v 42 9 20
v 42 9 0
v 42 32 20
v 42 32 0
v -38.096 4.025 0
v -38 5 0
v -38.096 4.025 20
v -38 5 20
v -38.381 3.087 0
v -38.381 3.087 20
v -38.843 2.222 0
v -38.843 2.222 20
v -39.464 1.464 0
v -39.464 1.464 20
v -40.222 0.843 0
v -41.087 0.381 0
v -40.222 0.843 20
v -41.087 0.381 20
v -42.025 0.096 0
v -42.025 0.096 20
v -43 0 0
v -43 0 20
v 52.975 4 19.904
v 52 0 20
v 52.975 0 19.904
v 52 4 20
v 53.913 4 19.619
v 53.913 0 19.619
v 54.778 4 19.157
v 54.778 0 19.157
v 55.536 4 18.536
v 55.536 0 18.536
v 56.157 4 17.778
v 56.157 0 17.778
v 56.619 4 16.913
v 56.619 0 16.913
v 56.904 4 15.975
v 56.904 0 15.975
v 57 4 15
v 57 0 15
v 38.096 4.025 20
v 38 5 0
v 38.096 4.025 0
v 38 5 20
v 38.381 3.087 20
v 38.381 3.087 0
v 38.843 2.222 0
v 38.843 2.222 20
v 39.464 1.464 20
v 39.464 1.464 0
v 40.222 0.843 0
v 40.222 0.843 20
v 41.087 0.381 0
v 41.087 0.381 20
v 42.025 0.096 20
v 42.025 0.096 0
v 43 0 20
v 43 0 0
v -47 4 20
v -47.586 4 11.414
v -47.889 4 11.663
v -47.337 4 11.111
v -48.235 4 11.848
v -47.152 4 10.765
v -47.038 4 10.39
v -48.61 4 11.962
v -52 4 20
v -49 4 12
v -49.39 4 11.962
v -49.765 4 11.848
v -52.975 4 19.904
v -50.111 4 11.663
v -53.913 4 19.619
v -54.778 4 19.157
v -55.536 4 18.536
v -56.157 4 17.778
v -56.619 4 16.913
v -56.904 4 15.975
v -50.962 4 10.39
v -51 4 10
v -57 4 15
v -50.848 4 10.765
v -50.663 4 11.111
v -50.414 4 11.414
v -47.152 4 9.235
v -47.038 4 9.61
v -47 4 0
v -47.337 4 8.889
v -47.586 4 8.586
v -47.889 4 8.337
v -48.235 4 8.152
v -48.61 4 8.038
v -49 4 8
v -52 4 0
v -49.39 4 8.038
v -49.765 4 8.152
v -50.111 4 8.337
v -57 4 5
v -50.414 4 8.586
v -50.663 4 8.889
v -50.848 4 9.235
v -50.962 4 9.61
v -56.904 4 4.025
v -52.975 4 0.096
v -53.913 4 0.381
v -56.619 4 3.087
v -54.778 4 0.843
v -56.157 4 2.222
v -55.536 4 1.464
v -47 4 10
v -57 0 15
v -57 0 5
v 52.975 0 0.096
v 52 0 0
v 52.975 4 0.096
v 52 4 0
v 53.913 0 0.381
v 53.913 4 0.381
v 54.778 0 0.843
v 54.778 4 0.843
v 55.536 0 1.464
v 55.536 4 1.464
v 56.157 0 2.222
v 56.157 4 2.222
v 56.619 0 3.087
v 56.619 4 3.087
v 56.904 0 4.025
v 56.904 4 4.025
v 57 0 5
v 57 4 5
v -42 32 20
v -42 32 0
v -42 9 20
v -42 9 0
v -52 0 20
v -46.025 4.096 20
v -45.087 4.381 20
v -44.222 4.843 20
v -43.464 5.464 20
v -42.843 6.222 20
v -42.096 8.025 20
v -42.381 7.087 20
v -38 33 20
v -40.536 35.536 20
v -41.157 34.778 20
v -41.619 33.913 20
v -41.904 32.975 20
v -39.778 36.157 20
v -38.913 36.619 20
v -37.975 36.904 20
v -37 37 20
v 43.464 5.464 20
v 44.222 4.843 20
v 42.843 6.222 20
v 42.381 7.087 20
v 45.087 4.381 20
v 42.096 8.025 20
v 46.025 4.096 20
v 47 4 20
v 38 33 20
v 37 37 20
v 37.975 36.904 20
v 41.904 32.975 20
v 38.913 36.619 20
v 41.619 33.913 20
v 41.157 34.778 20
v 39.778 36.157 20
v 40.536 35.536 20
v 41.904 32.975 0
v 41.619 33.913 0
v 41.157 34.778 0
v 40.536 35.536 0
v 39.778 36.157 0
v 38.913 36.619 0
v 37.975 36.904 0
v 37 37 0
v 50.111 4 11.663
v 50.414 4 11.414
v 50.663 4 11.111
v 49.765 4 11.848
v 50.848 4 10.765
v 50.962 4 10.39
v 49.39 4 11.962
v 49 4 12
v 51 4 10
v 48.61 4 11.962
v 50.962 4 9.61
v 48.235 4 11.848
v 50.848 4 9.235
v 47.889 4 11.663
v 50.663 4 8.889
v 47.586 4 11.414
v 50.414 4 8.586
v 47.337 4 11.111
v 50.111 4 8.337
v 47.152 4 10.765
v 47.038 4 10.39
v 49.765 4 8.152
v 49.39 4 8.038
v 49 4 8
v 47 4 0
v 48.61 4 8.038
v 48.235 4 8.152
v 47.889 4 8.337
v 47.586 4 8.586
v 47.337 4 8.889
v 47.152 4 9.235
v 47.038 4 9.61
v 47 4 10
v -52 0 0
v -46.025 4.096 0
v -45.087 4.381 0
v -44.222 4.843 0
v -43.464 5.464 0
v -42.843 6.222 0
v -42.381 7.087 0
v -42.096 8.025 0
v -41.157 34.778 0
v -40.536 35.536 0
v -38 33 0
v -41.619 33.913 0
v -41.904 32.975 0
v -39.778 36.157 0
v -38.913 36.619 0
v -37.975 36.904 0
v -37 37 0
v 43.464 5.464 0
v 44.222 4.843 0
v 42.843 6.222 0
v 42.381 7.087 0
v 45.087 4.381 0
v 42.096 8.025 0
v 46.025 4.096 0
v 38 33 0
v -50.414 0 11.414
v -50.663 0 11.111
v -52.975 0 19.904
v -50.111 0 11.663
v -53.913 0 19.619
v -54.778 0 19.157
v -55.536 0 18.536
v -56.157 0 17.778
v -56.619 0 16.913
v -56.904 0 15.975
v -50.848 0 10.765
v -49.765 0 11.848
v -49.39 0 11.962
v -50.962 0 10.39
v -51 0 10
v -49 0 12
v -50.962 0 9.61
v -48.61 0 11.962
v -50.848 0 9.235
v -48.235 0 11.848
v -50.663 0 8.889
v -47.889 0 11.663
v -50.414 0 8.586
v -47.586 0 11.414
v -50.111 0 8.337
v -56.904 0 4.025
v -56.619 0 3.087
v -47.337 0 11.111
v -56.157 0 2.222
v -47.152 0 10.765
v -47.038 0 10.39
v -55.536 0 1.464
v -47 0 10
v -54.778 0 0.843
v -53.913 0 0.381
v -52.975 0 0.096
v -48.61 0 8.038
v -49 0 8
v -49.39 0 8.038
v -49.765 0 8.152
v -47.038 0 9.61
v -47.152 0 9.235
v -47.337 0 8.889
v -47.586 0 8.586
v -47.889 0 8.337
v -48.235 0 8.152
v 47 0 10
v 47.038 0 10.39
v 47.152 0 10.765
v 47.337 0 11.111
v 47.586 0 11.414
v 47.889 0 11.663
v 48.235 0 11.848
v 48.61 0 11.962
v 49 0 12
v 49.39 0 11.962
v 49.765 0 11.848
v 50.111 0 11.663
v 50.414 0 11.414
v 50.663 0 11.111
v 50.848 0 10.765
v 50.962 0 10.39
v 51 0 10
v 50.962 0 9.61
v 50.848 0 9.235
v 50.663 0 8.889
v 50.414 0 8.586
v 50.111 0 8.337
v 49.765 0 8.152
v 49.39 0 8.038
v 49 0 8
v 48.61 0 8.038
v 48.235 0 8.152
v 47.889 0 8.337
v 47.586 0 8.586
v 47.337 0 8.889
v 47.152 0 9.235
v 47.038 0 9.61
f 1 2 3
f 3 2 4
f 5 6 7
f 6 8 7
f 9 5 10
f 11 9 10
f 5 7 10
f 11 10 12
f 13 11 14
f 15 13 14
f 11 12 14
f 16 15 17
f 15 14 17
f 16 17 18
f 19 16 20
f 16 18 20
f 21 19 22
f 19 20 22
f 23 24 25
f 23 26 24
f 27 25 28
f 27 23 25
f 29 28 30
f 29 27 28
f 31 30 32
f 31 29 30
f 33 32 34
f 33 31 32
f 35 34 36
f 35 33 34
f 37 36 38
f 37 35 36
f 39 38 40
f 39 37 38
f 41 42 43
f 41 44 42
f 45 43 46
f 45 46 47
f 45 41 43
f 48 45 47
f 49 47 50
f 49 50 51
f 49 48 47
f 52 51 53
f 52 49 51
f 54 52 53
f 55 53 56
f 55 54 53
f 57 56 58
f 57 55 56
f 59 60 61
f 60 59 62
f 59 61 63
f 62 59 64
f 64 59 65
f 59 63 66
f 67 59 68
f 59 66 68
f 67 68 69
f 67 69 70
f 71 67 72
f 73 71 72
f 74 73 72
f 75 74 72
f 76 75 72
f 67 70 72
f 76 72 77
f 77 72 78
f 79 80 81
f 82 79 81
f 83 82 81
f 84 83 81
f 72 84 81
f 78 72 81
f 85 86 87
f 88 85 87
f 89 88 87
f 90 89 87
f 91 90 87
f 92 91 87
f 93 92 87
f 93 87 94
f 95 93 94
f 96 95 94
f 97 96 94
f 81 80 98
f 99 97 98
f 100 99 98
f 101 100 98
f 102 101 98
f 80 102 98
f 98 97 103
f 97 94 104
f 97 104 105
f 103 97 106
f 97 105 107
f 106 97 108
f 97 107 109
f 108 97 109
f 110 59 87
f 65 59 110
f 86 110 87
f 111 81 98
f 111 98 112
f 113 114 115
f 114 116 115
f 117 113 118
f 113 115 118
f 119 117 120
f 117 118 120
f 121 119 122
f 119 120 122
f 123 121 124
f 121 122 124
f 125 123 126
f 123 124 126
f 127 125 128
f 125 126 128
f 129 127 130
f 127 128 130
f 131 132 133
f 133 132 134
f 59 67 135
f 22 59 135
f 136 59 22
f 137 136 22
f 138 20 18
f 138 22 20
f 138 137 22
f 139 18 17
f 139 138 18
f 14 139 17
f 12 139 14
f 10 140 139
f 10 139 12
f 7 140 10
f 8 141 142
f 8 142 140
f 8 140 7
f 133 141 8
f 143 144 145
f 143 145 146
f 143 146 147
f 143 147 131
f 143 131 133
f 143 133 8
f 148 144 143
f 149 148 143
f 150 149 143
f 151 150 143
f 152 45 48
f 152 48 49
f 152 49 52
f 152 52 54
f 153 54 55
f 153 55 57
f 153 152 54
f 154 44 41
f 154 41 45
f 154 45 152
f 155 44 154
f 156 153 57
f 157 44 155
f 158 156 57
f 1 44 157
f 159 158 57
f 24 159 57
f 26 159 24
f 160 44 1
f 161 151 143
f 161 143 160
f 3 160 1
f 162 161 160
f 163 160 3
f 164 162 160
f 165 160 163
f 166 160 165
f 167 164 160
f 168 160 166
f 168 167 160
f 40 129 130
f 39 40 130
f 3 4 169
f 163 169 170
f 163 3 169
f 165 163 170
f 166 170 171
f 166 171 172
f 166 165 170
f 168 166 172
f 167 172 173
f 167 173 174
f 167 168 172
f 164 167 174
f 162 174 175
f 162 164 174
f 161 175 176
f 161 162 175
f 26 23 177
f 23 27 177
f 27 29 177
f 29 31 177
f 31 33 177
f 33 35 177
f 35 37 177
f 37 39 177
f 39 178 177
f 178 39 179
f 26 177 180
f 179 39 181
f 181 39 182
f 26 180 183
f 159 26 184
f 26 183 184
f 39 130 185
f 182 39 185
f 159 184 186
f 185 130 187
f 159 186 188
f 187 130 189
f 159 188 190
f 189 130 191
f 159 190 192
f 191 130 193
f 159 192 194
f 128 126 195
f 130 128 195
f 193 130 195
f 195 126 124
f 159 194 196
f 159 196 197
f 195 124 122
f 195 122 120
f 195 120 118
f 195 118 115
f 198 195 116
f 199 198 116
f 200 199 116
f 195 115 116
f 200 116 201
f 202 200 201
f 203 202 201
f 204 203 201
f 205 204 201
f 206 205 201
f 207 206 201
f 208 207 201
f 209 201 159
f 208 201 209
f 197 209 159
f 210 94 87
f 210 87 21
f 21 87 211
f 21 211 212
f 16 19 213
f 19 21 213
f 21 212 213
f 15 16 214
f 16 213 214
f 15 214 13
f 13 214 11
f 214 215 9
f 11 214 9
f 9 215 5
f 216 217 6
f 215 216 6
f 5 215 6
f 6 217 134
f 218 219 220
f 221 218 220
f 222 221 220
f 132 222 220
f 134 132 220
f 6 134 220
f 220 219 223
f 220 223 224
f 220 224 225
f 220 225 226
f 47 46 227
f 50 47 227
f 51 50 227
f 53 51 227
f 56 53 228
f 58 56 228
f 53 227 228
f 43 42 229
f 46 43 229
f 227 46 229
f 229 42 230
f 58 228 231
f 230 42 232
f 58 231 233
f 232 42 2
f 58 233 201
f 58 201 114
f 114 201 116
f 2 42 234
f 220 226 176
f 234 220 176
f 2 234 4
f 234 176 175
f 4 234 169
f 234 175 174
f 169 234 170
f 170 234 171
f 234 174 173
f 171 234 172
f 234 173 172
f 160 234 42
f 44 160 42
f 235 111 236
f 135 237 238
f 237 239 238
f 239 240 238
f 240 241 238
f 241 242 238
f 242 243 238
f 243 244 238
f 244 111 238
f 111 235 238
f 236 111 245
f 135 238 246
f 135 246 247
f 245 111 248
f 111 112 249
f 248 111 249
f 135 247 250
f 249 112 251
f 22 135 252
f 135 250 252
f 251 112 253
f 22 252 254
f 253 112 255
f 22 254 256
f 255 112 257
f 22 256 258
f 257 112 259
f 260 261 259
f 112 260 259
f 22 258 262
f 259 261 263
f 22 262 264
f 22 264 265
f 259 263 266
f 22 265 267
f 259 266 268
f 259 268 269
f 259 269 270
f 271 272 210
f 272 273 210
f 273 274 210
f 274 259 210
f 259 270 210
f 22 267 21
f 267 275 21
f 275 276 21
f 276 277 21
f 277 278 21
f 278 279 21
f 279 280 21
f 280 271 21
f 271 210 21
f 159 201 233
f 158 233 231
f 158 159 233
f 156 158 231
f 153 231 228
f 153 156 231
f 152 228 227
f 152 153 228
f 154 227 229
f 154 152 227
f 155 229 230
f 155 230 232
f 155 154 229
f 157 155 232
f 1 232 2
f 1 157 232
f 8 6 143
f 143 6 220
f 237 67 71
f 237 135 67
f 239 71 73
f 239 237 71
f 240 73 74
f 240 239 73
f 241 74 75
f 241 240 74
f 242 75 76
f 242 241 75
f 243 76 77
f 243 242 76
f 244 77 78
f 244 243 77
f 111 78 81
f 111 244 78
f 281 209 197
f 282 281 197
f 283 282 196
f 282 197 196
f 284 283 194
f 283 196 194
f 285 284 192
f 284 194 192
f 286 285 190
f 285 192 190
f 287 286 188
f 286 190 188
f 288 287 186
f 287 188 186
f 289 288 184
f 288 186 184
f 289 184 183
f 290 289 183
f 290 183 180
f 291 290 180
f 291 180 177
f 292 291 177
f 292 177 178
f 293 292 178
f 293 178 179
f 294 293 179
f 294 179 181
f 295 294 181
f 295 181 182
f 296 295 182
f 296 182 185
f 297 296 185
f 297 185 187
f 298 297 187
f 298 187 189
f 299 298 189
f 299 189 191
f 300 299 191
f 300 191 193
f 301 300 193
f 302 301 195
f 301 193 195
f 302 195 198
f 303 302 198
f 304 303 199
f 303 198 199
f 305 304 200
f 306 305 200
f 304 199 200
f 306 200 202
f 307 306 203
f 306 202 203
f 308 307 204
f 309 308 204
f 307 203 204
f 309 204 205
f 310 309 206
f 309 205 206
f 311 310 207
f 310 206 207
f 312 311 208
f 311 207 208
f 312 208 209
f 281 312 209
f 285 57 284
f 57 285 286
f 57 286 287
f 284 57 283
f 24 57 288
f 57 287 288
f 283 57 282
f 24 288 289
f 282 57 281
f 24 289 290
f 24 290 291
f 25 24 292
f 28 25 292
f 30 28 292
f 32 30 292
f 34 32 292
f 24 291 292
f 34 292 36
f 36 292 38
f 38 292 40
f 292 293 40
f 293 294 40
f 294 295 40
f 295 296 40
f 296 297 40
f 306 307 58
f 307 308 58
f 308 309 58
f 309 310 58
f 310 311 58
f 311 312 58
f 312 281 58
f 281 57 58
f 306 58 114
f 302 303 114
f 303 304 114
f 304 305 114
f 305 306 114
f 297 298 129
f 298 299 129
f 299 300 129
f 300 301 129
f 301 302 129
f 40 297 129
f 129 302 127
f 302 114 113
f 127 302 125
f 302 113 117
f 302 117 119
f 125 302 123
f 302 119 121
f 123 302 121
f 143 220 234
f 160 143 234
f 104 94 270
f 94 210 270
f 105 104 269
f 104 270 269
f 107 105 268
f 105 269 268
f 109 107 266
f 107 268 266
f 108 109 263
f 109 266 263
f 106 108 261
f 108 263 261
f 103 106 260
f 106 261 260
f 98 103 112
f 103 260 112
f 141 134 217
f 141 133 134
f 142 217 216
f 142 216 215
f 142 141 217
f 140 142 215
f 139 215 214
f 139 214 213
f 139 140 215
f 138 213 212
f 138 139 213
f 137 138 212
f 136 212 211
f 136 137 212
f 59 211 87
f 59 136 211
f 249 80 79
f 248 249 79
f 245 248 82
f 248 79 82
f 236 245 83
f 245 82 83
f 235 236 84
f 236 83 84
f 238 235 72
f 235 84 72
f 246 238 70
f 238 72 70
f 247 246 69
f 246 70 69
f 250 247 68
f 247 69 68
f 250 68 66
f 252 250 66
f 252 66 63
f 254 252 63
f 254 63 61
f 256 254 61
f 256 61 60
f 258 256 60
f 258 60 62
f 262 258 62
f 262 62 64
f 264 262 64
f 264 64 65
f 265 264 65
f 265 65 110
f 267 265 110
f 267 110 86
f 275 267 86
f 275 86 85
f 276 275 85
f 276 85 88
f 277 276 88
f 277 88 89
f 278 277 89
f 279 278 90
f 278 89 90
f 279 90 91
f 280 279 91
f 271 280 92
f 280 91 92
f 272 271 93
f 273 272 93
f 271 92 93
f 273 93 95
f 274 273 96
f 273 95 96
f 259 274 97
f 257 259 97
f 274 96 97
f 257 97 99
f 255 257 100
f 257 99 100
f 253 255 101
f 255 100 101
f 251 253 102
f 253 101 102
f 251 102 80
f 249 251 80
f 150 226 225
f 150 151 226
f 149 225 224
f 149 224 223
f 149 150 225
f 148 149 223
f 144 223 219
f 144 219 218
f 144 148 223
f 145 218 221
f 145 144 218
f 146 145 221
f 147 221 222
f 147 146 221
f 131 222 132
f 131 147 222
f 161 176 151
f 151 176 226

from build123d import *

# Parameters (mm, degrees)
F1_DEPTH = 20
F2_R     = 2
F3_DEPTH = 25
F4_R     = 4.99999


# Not quite as in the source:
# - a fillet or chamfer is up to 0.001 mm smaller than in the source, because OpenCascade refuses the exact size


with BuildPart() as f1:
    # F0 (on Top) → F1 (new body)
    with BuildSketch(Plane.XY):
        Polygon((-38, 33), (0, 33), (0, 37), (-42, 37), (-42, 4), (-57, 4), (-57, 0), (-38, 0), align=None)
        Polygon((0, 37), (0, 33), (38, 33), (38, 0), (57, 0), (57, 4), (42, 4), (42, 37), align=None)
    extrude(amount=F1_DEPTH)

    # F2 (on face) → F3 (cut)
    with BuildSketch(Plane(origin=(0, 4, 0), x_dir=(-1, 0, 0), z_dir=(0, 1, 0))):
        with Locations((49, 10)):
            Circle(F2_R)
        with Locations((-49, 10)):
            Circle(F2_R)
    extrude(amount=-F3_DEPTH, mode=Mode.SUBTRACT)

    # F4 (radius 5 in the source; OpenCascade refuses exactly that, so slightly less here)
    f4_edges = [f1.edges().sort_by_distance(p)[0] for p in [
        (-57, 2, 20),
        (-57, 2, 0),
        (57, 2, 0),
        (57, 2, 20),
        (42, 37, 10),
        (-42, 37, 10),
        (-38, 0, 10),
        (38, 0, 10),
        (42, 4, 10),
        (-42, 4, 10),
    ]]
    fillet(f4_edges, radius=F4_R)


solid = f1.part
